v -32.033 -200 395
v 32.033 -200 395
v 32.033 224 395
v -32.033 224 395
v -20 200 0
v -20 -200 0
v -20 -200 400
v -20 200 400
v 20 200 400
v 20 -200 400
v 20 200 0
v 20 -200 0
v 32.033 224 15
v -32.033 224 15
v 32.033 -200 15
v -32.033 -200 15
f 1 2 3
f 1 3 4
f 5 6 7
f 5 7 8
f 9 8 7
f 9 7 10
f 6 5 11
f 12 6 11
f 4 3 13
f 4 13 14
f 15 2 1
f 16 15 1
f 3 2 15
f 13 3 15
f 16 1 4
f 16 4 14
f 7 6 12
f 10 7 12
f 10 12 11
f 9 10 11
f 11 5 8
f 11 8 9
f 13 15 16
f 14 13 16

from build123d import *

# Parameters (mm, degrees)
SCHIZZO1_W                   = 40
SCHIZZO1_H                   = 400
ESTRUSIONE_ESTRUSIONE1_DEPTH = 400
SCHIZZO4_W                   = 64.066675396
SCHIZZO4_H                   = 380
ESTRUSIONE_ESTRUSIONE3_DEPTH = 424


with BuildPart() as part:
    # Schizzo1 → Estrusione-Estrusione1 (new body)
    with BuildSketch(Plane.XY):
        Rectangle(SCHIZZO1_W, SCHIZZO1_H)
    extrude(amount=ESTRUSIONE_ESTRUSIONE1_DEPTH)


with BuildPart() as body_2:
    # Schizzo4 → Estrusione-Estrusione3 (new body)
    with BuildSketch(Plane(origin=(0, -200, 0), x_dir=(-1, 0, 0), z_dir=(0, -1, 0))):
        with Locations((0, -205)):
            Rectangle(SCHIZZO4_W, SCHIZZO4_H)
    extrude(amount=-ESTRUSIONE_ESTRUSIONE3_DEPTH)


solid = Compound([part.part, body_2.part])
